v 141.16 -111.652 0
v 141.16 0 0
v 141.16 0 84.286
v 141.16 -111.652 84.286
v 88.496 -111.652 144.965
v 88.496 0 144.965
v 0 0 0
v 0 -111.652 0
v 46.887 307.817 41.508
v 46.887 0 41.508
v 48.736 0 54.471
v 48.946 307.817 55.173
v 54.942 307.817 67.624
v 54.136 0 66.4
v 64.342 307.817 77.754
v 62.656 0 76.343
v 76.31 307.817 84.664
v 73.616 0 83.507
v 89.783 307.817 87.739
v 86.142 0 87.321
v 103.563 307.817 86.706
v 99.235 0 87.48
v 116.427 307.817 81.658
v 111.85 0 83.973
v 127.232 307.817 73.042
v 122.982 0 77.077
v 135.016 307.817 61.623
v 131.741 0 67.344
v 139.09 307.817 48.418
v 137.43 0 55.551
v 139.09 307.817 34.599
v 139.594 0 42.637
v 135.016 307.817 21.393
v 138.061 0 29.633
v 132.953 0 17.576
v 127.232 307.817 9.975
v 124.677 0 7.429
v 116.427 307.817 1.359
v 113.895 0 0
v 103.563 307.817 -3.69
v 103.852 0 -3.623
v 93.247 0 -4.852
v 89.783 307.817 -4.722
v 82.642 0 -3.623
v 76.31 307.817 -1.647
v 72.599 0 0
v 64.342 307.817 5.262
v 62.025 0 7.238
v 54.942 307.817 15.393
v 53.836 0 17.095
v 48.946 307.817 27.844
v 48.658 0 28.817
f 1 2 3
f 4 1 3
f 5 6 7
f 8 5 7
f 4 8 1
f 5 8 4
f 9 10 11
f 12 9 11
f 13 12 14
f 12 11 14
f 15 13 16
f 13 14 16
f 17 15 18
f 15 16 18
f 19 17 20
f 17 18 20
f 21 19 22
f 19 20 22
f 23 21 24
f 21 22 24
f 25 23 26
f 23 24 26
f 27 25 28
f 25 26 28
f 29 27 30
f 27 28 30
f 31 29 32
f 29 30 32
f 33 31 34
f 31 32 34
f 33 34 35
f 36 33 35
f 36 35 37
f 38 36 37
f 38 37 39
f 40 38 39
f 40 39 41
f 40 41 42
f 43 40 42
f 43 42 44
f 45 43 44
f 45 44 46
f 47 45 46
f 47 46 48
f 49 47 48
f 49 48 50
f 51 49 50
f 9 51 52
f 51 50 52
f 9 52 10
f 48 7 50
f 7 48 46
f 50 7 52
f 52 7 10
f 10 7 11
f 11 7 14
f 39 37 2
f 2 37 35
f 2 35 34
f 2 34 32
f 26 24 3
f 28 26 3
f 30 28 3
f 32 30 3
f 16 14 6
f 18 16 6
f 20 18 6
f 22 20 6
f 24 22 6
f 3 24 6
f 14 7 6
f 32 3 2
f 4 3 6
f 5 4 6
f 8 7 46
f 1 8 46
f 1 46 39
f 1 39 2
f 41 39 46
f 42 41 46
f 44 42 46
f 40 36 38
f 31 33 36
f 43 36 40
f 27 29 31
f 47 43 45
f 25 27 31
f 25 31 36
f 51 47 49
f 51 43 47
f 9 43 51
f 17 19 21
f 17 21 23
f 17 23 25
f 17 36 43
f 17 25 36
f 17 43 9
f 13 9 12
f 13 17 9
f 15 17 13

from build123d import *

# Parameters (mm, degrees)
F1_DEPTH = 111.651853
F2_R     = 46.360337
F3_DEPTH = 307.816686


with BuildPart() as f1:
    # F0 (on Front) → F1 (new body)
    with BuildSketch(Plane.XZ):
        Polygon((0, 0), (141.16028, 0), (141.16028, 84.286302), (88.496365, 144.964725), align=None)
    extrude(amount=F1_DEPTH)

    # F2 (on face) → F3 (join)
    with BuildSketch(Plane(origin=(0, 0, 0), x_dir=(-1, 0, 0), z_dir=(0, 1, 0))):
        with Locations((-93.247063, 41.50847)):
            Circle(F2_R)
    extrude(amount=F3_DEPTH)


solid = f1.part
